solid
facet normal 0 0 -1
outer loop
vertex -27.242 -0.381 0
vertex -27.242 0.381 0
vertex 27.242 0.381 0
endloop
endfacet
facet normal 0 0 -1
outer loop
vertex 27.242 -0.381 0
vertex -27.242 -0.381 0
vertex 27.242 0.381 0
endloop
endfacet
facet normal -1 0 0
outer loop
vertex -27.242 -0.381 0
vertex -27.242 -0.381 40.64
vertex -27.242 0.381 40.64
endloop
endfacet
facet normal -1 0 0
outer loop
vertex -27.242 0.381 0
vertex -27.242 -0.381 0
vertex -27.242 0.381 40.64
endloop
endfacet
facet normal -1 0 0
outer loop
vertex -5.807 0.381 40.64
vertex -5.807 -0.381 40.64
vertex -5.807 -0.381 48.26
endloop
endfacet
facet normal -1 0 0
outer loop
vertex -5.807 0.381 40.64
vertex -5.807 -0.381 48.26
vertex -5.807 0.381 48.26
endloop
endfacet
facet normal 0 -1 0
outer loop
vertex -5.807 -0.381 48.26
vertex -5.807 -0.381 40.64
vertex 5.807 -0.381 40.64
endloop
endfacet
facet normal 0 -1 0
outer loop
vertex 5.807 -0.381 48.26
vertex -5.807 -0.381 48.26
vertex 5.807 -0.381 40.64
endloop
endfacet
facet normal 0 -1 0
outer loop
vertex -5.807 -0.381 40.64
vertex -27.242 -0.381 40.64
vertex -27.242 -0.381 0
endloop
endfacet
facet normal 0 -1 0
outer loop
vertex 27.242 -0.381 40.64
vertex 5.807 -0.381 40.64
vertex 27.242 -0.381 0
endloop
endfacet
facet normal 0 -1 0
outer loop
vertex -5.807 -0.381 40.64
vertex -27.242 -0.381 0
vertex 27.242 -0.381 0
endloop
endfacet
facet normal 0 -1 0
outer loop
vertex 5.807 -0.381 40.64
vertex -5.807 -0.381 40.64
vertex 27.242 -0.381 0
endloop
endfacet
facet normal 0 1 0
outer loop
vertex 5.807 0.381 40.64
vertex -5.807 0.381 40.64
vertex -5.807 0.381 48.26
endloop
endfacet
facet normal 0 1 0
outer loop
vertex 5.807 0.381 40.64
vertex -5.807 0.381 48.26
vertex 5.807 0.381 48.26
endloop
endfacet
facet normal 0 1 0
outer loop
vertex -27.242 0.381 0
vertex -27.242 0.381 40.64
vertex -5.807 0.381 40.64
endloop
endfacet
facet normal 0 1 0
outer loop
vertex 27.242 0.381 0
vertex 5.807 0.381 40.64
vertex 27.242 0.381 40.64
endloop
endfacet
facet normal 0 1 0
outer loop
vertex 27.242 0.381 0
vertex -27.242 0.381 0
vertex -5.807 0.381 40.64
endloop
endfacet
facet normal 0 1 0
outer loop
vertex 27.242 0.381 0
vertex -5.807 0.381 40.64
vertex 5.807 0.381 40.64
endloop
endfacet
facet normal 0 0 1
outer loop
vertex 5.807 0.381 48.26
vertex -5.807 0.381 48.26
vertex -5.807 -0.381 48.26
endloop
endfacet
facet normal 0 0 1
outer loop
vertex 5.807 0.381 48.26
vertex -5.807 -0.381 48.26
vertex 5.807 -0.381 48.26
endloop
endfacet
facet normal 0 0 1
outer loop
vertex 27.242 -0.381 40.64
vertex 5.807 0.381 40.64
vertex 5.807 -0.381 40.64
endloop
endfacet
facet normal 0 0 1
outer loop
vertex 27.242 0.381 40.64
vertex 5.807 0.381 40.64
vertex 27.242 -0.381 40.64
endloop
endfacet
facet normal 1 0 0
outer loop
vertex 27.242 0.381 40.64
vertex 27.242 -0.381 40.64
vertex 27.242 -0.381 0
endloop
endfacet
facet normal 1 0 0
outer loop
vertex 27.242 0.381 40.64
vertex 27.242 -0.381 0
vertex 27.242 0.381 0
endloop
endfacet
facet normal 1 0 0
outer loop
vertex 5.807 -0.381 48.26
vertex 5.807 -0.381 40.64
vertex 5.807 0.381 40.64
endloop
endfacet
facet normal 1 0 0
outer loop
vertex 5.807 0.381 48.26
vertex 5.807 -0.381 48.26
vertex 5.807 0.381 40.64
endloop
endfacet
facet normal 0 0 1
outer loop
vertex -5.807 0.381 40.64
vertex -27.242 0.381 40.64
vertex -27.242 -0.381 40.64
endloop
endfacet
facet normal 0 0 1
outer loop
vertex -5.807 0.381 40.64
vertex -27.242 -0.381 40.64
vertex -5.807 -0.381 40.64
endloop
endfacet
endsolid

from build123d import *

# Parameters (mm, degrees)
F0_W     = 21.434508
F0_H     = 0.762
F1_DEPTH = 40.64
F0_W_2   = 11.613984
F2_DEPTH = 48.26


with BuildPart() as f1:
    # F0 (on Top) → F1 (new body)
    with BuildSketch(Plane.XY):
        with Locations((16.524246, 0)):
            Rectangle(F0_W, F0_H)
        with Locations((-16.524246, 0)):
            Rectangle(F0_W, F0_H)
    extrude(amount=F1_DEPTH)

    # F0 (on Top) → F2 (join)
    with BuildSketch(Plane.XY):
        Rectangle(F0_W_2, F0_H)
    extrude(amount=F2_DEPTH)


solid = f1.part
